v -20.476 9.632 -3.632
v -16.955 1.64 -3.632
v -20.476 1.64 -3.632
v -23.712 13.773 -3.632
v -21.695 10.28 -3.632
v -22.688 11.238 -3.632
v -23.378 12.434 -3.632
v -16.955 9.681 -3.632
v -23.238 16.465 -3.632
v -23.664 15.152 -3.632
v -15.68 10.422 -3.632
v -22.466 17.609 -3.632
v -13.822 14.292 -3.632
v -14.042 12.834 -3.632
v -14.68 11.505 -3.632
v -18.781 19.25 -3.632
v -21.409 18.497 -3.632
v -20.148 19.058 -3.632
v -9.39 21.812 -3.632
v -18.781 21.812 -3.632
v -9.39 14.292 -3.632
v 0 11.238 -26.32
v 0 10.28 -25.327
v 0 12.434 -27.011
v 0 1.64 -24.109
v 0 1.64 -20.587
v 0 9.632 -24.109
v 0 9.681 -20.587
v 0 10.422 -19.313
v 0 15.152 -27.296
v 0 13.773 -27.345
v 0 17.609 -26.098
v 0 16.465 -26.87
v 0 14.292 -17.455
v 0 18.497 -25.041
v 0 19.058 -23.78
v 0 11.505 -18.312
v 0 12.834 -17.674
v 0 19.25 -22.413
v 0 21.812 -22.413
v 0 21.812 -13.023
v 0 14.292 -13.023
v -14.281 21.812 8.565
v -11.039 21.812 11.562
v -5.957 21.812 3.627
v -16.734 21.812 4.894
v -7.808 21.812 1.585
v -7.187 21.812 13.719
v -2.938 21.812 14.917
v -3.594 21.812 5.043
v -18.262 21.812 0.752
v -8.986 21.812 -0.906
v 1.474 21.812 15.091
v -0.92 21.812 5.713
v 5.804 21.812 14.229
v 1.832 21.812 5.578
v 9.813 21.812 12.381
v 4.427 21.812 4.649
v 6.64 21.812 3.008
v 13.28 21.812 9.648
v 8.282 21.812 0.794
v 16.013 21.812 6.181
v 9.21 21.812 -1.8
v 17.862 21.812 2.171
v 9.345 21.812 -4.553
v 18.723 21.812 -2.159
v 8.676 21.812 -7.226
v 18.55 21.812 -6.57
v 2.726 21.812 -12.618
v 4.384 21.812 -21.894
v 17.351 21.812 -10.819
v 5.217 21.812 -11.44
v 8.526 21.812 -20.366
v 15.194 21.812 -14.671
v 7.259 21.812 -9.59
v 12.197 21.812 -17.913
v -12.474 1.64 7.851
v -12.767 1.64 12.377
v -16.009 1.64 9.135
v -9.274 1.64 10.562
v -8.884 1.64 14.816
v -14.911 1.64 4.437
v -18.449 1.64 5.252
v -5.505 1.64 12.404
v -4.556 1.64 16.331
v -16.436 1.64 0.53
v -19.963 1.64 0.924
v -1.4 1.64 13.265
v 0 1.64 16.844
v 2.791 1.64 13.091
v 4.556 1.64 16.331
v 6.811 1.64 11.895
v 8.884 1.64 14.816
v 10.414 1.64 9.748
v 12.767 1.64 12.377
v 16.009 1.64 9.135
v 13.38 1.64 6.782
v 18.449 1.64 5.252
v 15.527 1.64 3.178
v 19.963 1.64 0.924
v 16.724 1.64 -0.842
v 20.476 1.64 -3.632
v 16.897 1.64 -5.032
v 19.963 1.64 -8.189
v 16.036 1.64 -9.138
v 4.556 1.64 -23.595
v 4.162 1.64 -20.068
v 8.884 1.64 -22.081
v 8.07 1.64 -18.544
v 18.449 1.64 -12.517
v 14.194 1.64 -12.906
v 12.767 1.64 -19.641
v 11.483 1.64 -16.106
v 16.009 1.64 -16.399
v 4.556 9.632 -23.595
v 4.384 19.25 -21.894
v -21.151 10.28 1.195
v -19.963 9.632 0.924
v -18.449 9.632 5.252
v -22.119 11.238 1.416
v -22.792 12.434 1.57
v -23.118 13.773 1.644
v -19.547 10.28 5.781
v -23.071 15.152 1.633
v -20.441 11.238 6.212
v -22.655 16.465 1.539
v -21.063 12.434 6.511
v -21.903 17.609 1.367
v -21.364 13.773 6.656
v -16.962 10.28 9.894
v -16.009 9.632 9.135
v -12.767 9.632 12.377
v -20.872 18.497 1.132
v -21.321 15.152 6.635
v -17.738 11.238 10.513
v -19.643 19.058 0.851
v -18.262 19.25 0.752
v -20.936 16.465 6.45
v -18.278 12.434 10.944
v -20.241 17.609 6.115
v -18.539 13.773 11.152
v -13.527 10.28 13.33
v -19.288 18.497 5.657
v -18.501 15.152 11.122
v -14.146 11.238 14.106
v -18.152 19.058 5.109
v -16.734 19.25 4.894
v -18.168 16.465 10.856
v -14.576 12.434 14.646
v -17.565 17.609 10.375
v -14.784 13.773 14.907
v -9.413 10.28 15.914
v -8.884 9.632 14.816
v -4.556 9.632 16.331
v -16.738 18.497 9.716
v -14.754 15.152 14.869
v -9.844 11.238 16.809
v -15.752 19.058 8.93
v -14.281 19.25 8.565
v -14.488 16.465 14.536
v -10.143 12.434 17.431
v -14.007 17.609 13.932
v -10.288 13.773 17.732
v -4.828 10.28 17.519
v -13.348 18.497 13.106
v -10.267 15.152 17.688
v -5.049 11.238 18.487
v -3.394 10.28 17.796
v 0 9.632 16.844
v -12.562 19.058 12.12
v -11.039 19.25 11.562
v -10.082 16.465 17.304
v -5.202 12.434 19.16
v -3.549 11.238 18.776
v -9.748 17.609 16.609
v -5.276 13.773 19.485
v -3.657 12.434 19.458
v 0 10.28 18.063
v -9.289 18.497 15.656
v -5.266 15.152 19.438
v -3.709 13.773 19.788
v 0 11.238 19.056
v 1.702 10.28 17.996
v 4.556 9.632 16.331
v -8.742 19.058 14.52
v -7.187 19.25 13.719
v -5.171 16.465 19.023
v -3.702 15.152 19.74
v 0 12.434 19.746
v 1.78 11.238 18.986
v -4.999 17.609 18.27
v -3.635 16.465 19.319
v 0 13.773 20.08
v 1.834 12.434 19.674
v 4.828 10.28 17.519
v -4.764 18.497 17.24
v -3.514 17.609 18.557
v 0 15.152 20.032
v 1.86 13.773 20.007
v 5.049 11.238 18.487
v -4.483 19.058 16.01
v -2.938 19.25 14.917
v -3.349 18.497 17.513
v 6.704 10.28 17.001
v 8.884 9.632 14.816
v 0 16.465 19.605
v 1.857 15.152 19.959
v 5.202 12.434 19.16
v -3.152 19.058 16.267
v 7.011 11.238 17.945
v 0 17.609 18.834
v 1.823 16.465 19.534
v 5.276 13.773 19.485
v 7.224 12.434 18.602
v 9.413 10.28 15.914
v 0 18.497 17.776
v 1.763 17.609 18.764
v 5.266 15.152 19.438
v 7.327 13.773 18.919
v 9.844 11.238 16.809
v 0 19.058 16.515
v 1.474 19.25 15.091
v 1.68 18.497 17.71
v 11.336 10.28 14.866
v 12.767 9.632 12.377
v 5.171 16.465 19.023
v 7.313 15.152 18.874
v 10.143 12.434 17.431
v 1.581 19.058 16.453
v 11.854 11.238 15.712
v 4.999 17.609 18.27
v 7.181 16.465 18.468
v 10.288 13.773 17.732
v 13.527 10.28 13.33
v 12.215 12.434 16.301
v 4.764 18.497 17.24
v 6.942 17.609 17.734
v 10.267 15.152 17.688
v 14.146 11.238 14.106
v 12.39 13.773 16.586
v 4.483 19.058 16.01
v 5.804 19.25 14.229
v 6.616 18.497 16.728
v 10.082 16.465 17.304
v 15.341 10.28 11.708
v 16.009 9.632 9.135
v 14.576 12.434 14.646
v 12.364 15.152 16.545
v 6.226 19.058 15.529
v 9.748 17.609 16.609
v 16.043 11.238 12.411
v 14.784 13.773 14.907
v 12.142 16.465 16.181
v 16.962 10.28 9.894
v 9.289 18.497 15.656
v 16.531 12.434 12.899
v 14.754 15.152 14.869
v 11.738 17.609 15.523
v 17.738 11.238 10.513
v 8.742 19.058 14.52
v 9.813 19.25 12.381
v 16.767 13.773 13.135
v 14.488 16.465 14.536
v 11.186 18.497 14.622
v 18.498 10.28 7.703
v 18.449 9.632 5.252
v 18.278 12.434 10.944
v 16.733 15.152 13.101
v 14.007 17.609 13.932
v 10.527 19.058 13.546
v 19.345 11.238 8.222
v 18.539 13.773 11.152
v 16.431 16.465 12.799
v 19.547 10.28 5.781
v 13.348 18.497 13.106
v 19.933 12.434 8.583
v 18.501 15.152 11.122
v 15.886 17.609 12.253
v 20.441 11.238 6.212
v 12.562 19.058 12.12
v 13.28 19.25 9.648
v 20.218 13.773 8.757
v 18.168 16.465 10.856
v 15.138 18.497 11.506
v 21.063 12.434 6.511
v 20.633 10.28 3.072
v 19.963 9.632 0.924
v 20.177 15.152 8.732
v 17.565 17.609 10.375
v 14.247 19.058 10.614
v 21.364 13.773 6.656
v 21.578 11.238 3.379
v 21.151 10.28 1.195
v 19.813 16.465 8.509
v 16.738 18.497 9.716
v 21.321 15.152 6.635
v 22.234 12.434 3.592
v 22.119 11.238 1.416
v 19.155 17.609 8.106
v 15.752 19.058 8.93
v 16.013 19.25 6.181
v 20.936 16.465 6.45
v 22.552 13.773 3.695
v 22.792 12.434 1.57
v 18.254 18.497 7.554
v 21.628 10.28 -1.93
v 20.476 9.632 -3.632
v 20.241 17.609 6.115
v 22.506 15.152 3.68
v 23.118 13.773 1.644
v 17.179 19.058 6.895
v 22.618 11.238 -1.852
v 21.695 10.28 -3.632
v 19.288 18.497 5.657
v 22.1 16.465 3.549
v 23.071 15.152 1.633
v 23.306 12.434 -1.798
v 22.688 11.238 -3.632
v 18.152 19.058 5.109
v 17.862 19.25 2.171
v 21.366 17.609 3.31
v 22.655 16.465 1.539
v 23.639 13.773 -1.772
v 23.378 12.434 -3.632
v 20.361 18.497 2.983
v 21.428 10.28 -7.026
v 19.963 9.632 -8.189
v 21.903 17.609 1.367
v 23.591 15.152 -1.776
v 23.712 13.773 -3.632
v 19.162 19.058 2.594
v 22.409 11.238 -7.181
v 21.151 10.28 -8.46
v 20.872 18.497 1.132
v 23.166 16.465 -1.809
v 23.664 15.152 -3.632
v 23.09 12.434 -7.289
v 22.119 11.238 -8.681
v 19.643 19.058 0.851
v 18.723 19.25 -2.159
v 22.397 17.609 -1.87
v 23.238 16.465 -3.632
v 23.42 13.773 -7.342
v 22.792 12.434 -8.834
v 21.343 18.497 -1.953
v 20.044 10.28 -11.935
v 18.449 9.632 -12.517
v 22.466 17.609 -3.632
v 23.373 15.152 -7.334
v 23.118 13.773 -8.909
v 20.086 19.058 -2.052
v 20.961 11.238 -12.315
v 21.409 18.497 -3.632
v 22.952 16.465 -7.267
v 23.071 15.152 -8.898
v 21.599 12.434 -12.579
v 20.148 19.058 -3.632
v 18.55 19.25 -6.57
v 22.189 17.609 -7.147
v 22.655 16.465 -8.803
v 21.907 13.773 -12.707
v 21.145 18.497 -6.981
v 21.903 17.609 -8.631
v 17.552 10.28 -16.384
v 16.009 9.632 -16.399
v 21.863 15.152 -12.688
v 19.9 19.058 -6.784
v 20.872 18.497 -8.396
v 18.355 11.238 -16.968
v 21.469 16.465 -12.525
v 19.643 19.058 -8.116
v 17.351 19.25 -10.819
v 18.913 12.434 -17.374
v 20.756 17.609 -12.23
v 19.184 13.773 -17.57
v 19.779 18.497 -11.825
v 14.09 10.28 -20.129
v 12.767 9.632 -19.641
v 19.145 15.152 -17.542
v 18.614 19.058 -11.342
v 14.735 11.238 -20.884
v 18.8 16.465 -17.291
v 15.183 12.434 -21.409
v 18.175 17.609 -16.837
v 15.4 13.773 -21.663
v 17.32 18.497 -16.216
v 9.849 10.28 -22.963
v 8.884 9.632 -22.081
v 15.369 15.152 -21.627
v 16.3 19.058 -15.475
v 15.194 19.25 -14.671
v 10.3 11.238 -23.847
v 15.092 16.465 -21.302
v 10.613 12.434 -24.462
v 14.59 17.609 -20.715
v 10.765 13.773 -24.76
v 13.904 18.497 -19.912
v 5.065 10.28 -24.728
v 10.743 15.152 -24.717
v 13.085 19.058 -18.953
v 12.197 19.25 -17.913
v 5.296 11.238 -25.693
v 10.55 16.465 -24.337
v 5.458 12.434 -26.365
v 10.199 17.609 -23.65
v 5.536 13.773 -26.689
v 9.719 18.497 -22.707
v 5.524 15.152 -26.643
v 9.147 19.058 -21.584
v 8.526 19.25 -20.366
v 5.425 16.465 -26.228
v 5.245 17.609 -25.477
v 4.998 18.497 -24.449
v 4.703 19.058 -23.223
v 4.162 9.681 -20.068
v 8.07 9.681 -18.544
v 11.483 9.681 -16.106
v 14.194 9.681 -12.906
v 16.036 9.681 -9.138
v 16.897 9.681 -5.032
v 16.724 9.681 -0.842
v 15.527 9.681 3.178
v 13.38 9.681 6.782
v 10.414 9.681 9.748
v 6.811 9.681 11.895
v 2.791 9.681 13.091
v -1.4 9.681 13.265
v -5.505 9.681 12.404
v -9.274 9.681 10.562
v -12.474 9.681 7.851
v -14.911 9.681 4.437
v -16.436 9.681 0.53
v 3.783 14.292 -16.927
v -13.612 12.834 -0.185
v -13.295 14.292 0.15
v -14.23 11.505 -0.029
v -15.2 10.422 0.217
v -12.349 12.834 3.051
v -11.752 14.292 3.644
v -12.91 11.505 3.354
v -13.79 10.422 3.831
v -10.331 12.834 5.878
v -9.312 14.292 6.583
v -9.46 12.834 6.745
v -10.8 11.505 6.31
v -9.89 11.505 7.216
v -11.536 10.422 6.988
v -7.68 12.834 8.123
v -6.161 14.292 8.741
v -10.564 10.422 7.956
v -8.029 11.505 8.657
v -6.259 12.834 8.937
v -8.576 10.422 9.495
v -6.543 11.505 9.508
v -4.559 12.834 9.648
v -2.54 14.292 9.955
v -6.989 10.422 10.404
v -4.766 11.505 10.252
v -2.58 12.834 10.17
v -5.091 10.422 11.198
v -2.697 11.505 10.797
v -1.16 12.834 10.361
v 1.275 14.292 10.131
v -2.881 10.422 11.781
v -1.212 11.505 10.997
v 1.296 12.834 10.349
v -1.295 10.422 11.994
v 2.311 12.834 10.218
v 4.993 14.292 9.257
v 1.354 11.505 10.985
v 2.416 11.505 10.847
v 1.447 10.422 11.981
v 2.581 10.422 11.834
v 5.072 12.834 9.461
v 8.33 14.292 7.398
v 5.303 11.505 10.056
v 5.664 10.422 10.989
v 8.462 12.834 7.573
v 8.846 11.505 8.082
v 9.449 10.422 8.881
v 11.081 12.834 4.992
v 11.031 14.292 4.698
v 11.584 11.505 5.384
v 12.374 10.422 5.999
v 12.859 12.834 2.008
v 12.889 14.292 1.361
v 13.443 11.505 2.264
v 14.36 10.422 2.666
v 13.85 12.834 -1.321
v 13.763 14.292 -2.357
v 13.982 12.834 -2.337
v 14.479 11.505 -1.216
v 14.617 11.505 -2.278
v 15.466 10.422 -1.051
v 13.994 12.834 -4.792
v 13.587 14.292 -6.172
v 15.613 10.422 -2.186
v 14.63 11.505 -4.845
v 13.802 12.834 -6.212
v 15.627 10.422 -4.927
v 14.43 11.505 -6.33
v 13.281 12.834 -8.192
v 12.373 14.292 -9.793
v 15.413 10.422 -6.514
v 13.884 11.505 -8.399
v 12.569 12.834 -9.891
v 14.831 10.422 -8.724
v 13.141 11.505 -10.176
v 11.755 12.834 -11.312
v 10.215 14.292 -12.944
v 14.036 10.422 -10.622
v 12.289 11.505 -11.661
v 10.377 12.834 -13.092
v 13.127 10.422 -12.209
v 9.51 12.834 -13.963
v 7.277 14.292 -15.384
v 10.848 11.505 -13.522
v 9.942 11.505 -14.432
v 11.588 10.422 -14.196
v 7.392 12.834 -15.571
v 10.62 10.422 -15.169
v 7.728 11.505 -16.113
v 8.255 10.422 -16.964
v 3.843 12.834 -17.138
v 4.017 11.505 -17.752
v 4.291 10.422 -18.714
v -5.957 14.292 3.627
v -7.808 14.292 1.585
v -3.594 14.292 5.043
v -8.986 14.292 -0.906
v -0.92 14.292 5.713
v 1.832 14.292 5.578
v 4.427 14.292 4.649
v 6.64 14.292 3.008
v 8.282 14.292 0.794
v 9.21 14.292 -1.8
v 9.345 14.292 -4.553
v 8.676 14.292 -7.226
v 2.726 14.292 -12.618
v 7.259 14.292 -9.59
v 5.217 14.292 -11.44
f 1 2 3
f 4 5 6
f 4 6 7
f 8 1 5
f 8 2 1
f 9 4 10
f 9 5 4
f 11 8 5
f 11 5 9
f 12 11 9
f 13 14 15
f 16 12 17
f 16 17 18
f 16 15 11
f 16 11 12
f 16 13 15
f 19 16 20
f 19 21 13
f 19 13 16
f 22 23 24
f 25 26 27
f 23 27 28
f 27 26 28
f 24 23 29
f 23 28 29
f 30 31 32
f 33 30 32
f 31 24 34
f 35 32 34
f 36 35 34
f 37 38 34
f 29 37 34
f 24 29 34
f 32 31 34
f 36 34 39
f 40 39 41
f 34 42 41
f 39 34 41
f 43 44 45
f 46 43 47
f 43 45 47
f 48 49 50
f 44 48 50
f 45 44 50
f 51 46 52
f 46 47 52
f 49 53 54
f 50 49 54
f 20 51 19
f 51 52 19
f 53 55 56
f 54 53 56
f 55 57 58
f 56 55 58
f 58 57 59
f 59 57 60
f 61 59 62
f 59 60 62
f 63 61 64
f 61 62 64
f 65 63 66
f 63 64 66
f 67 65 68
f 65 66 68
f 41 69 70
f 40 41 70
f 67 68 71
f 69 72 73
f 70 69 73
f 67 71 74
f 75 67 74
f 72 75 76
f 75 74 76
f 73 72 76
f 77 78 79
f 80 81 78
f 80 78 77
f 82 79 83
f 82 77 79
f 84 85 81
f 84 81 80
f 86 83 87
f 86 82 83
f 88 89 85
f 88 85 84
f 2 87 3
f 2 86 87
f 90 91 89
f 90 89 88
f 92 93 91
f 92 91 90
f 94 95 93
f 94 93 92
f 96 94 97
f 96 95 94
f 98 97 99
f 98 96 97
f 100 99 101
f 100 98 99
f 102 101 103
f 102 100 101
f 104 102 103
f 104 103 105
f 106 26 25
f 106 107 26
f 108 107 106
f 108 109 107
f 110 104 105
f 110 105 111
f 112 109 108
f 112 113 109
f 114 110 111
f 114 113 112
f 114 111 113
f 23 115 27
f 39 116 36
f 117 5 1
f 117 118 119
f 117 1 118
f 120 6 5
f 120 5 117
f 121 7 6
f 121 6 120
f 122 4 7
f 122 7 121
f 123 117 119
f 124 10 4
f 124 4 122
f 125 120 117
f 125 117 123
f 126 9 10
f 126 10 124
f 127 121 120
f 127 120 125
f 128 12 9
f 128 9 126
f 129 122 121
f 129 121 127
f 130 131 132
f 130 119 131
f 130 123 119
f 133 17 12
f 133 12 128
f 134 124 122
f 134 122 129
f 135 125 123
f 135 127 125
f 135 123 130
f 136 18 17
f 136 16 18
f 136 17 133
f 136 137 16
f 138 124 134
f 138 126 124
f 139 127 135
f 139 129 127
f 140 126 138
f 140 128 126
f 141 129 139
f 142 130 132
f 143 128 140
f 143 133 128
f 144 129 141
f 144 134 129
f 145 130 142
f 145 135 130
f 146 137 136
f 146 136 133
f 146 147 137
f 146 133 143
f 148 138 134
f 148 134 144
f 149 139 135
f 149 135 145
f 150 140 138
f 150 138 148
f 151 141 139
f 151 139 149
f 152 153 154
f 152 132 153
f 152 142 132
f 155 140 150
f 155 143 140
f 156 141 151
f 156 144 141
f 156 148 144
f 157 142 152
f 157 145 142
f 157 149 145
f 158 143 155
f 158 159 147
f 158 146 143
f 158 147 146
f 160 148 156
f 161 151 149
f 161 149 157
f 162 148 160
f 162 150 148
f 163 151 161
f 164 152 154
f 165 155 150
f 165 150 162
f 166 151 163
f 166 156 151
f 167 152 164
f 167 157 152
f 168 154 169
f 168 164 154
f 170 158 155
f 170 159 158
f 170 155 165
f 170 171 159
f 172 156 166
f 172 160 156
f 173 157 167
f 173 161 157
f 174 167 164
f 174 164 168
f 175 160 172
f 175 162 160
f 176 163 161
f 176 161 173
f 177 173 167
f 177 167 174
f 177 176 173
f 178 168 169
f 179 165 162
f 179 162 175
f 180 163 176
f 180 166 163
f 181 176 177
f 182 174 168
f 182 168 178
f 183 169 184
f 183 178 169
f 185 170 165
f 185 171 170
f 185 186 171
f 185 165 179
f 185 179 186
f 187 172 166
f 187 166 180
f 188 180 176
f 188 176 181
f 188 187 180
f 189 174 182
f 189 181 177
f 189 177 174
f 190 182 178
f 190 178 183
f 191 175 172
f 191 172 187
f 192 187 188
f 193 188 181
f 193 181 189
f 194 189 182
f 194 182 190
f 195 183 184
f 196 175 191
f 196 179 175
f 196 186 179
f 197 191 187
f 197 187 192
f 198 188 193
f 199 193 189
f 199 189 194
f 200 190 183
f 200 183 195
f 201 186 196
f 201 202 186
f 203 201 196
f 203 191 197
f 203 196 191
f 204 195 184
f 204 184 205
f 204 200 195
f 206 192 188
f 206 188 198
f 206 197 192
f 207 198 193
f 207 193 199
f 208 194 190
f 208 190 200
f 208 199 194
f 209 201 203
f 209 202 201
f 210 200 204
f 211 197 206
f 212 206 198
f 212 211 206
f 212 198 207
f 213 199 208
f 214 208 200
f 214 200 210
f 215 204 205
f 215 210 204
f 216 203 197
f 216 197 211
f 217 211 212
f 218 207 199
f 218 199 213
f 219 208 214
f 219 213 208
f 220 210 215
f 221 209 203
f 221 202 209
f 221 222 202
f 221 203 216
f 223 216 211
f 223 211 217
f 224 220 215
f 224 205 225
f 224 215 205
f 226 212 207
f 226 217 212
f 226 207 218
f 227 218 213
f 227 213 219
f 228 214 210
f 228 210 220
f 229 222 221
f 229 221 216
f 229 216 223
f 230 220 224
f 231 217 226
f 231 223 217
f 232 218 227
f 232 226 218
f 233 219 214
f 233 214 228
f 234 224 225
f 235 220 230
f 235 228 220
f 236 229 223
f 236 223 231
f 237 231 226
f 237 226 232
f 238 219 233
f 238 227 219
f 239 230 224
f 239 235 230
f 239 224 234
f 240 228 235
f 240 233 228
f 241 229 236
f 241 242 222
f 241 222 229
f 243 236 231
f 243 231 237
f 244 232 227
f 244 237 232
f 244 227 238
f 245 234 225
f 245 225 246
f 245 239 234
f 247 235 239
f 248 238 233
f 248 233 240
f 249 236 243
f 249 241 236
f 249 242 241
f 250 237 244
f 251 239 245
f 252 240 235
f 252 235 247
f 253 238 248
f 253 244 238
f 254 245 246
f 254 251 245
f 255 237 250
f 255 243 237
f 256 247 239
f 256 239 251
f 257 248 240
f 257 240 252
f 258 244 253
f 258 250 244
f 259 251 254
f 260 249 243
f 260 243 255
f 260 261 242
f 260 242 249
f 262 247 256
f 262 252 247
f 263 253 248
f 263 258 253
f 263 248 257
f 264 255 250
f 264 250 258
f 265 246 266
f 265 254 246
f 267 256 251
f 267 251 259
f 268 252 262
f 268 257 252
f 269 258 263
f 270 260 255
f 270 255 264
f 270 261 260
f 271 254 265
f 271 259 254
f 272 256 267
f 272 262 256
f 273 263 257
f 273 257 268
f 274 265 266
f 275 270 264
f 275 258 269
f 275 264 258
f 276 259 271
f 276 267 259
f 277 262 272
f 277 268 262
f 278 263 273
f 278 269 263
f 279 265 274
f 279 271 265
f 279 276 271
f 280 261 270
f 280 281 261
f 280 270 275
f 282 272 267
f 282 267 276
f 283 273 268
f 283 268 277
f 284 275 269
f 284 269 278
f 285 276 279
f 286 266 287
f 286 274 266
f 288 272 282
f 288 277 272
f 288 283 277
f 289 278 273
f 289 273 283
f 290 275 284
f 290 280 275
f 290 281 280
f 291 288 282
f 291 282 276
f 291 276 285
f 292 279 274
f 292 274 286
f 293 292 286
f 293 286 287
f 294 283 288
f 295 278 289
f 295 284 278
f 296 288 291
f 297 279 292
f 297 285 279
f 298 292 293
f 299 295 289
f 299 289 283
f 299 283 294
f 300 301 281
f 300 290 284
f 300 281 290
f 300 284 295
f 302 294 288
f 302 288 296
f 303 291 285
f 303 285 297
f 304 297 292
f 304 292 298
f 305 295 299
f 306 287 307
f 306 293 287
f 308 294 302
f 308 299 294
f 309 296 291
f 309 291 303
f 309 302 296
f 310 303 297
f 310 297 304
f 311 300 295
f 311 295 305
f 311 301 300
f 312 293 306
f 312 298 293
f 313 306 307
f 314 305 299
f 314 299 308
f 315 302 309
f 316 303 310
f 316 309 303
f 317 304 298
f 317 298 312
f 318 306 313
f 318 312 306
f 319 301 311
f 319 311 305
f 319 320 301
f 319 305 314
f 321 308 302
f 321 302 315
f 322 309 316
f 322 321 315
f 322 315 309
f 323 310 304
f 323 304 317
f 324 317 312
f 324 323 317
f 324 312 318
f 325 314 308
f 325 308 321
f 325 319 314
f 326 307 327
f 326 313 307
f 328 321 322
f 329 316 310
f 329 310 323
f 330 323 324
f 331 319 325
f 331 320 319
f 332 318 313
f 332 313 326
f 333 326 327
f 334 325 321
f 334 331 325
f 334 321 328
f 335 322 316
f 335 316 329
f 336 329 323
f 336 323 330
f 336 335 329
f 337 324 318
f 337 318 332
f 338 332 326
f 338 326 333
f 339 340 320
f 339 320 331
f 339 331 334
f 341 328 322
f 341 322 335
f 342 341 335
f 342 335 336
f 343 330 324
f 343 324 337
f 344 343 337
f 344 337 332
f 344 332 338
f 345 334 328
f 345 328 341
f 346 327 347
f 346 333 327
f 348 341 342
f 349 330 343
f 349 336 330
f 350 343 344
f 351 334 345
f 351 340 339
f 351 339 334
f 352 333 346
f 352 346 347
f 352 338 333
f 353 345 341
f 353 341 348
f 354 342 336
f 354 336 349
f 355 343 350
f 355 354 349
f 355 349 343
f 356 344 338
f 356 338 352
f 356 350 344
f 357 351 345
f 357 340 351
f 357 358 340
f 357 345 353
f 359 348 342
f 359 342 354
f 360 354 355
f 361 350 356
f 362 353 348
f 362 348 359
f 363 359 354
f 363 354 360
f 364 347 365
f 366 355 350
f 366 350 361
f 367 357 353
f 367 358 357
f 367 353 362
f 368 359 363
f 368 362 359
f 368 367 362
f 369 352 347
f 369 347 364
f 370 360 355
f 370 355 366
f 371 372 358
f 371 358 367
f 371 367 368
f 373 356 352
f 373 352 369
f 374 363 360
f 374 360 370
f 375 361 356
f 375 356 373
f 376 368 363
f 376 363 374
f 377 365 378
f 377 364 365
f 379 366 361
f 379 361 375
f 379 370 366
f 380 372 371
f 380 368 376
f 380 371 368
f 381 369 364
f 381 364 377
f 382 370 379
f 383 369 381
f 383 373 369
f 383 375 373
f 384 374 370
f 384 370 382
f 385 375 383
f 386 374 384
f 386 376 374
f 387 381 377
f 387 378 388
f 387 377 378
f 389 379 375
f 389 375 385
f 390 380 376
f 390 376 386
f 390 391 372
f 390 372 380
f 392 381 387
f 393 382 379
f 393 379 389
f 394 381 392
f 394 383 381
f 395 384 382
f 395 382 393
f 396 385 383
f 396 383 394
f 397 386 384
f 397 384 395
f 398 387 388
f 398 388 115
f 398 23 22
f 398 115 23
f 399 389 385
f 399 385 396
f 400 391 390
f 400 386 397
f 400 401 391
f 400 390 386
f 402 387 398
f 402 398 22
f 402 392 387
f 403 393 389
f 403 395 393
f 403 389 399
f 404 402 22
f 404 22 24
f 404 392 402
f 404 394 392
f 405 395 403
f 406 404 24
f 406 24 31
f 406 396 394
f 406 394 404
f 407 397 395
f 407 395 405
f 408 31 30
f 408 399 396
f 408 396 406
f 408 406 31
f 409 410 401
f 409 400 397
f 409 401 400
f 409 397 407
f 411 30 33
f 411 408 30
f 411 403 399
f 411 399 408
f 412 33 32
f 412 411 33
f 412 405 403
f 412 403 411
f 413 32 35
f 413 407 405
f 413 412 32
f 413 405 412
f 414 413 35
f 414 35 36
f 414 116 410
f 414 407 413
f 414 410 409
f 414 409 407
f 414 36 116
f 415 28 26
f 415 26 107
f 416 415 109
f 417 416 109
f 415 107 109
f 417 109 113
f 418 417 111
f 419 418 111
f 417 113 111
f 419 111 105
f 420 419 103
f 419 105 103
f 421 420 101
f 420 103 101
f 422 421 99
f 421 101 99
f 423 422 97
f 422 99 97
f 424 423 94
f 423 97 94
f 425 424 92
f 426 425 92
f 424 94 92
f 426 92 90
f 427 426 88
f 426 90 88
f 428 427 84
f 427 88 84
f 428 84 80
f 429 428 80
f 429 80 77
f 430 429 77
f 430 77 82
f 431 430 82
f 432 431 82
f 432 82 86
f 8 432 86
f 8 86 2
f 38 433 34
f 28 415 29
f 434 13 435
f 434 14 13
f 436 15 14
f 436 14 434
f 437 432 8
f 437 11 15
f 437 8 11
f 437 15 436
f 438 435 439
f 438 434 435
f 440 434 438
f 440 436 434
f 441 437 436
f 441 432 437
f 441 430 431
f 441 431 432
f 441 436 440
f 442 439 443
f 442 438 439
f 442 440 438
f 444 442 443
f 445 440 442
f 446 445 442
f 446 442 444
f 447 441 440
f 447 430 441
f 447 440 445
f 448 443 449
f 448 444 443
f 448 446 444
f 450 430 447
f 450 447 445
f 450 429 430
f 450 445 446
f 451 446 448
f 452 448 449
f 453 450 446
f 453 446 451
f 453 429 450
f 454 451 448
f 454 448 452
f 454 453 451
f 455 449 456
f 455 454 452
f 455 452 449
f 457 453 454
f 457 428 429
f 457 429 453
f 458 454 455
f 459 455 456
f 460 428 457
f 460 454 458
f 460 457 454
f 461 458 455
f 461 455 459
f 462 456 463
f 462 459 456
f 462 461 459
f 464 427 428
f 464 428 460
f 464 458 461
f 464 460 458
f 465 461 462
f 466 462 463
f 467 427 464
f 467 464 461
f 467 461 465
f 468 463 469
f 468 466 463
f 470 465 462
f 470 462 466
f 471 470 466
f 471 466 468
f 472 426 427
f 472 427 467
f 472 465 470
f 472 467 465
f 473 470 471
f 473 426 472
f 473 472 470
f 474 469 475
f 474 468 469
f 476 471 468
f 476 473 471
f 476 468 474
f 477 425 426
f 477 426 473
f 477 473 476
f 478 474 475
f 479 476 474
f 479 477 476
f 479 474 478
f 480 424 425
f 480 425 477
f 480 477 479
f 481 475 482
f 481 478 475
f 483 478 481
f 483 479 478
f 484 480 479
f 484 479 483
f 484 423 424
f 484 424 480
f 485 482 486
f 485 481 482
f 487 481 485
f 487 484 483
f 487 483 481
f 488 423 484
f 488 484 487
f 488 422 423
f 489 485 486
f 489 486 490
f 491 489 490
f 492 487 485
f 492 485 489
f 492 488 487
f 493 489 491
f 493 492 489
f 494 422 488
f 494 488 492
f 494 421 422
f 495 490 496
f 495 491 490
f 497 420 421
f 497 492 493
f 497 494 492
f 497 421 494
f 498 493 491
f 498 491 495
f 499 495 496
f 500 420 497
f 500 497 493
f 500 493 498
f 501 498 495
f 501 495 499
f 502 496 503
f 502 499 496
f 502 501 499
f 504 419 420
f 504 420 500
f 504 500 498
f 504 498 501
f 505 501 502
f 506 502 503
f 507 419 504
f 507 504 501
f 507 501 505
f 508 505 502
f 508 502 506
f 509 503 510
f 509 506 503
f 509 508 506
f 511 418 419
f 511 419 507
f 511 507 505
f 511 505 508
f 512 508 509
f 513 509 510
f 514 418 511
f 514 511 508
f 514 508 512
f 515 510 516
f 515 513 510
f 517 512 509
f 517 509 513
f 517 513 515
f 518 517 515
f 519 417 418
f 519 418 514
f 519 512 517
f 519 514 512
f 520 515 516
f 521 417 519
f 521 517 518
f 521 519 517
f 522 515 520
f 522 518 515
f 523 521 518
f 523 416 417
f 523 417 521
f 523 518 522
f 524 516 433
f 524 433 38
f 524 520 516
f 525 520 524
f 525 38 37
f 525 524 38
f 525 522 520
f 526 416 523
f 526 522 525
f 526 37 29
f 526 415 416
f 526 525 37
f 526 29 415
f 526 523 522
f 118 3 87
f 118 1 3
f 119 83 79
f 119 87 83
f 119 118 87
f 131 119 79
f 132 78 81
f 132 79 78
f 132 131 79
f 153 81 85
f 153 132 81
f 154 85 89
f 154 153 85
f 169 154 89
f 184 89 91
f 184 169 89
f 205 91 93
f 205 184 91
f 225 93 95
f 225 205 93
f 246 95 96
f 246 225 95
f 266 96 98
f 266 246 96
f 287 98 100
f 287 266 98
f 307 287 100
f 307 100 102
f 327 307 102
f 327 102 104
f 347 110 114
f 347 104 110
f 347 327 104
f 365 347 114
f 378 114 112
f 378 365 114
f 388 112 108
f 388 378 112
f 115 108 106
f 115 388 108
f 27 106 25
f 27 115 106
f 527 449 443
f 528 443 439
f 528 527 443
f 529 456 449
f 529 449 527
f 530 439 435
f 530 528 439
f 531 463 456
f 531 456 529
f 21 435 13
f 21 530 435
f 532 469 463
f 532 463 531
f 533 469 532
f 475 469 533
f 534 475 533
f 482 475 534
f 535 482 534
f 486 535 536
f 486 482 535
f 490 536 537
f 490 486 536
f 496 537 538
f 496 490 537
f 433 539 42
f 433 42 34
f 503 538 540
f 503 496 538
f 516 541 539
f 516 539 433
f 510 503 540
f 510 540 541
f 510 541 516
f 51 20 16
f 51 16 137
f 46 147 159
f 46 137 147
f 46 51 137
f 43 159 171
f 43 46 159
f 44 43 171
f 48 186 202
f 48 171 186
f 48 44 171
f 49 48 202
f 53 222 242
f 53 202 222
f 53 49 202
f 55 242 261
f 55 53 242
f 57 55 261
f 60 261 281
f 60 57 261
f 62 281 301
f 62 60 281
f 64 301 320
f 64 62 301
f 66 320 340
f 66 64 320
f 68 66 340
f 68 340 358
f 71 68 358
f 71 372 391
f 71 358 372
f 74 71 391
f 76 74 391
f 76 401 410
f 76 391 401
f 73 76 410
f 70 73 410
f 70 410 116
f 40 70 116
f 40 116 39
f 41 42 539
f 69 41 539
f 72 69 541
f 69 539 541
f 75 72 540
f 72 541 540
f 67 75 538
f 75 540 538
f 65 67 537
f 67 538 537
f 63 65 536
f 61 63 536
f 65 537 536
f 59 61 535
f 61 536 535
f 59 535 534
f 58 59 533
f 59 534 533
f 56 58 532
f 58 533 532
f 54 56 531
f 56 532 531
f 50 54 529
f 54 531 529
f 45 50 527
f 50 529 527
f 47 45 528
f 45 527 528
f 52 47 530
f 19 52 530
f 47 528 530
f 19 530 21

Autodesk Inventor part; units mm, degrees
ref_plane "YZ Plane" through (0, 0, 0) normal (1, 0, 0) x (0, 1, 0)
ref_plane "XZ Plane" through (0, 0, 0) normal (0, 1, 0) x (-1, 0, 0)
ref_plane "XY Plane" through (0, 0, 0) normal (0, 0, 1) x (1, 0, 0)
sketch "Sketch1" plane through (0, 0, 0) normal (1, 0, 0) x (0, 1, 0)
  line L0 (21.8125, -13.0228) -> (14.2915, -13.0228)
  line L1 (14.2915, -13.0228) -> (14.2915, -22.4132)
  line L2 (14.2915, -22.4132) -> (21.8125, -22.4132)
  line L3 (21.8125, -22.4132) -> (21.8125, -13.0228)
  circle A0 centre (14.2915, -22.4132) radius 4.9585
  line L4 (11.1179, -20.5873) -> (1.6405, -20.5873)
  line L5 (1.6405, -20.5873) -> (1.6405, -24.1087)
  line L6 (1.6405, -24.1087) -> (11.1179, -24.1087)
  line L7 (11.1179, -24.1087) -> (11.1179, -20.5873)
  line L8 (21.8125, -3.6323) -> (0.6841, -3.6323)
  point P0 (0, 0)
  point P1 (14.2915, -17.4546)
  point P2 (9.6814, -20.5873)
  point P3 (9.6319, -24.1087)
  point P4 (19.25, -22.4132)
revolve "Revolution1" add sketch "Sketch1" angle 270 about axis through (0, 21.8125, -3.6323) along (0, -1, 0)
properties part number "odd revolve"
